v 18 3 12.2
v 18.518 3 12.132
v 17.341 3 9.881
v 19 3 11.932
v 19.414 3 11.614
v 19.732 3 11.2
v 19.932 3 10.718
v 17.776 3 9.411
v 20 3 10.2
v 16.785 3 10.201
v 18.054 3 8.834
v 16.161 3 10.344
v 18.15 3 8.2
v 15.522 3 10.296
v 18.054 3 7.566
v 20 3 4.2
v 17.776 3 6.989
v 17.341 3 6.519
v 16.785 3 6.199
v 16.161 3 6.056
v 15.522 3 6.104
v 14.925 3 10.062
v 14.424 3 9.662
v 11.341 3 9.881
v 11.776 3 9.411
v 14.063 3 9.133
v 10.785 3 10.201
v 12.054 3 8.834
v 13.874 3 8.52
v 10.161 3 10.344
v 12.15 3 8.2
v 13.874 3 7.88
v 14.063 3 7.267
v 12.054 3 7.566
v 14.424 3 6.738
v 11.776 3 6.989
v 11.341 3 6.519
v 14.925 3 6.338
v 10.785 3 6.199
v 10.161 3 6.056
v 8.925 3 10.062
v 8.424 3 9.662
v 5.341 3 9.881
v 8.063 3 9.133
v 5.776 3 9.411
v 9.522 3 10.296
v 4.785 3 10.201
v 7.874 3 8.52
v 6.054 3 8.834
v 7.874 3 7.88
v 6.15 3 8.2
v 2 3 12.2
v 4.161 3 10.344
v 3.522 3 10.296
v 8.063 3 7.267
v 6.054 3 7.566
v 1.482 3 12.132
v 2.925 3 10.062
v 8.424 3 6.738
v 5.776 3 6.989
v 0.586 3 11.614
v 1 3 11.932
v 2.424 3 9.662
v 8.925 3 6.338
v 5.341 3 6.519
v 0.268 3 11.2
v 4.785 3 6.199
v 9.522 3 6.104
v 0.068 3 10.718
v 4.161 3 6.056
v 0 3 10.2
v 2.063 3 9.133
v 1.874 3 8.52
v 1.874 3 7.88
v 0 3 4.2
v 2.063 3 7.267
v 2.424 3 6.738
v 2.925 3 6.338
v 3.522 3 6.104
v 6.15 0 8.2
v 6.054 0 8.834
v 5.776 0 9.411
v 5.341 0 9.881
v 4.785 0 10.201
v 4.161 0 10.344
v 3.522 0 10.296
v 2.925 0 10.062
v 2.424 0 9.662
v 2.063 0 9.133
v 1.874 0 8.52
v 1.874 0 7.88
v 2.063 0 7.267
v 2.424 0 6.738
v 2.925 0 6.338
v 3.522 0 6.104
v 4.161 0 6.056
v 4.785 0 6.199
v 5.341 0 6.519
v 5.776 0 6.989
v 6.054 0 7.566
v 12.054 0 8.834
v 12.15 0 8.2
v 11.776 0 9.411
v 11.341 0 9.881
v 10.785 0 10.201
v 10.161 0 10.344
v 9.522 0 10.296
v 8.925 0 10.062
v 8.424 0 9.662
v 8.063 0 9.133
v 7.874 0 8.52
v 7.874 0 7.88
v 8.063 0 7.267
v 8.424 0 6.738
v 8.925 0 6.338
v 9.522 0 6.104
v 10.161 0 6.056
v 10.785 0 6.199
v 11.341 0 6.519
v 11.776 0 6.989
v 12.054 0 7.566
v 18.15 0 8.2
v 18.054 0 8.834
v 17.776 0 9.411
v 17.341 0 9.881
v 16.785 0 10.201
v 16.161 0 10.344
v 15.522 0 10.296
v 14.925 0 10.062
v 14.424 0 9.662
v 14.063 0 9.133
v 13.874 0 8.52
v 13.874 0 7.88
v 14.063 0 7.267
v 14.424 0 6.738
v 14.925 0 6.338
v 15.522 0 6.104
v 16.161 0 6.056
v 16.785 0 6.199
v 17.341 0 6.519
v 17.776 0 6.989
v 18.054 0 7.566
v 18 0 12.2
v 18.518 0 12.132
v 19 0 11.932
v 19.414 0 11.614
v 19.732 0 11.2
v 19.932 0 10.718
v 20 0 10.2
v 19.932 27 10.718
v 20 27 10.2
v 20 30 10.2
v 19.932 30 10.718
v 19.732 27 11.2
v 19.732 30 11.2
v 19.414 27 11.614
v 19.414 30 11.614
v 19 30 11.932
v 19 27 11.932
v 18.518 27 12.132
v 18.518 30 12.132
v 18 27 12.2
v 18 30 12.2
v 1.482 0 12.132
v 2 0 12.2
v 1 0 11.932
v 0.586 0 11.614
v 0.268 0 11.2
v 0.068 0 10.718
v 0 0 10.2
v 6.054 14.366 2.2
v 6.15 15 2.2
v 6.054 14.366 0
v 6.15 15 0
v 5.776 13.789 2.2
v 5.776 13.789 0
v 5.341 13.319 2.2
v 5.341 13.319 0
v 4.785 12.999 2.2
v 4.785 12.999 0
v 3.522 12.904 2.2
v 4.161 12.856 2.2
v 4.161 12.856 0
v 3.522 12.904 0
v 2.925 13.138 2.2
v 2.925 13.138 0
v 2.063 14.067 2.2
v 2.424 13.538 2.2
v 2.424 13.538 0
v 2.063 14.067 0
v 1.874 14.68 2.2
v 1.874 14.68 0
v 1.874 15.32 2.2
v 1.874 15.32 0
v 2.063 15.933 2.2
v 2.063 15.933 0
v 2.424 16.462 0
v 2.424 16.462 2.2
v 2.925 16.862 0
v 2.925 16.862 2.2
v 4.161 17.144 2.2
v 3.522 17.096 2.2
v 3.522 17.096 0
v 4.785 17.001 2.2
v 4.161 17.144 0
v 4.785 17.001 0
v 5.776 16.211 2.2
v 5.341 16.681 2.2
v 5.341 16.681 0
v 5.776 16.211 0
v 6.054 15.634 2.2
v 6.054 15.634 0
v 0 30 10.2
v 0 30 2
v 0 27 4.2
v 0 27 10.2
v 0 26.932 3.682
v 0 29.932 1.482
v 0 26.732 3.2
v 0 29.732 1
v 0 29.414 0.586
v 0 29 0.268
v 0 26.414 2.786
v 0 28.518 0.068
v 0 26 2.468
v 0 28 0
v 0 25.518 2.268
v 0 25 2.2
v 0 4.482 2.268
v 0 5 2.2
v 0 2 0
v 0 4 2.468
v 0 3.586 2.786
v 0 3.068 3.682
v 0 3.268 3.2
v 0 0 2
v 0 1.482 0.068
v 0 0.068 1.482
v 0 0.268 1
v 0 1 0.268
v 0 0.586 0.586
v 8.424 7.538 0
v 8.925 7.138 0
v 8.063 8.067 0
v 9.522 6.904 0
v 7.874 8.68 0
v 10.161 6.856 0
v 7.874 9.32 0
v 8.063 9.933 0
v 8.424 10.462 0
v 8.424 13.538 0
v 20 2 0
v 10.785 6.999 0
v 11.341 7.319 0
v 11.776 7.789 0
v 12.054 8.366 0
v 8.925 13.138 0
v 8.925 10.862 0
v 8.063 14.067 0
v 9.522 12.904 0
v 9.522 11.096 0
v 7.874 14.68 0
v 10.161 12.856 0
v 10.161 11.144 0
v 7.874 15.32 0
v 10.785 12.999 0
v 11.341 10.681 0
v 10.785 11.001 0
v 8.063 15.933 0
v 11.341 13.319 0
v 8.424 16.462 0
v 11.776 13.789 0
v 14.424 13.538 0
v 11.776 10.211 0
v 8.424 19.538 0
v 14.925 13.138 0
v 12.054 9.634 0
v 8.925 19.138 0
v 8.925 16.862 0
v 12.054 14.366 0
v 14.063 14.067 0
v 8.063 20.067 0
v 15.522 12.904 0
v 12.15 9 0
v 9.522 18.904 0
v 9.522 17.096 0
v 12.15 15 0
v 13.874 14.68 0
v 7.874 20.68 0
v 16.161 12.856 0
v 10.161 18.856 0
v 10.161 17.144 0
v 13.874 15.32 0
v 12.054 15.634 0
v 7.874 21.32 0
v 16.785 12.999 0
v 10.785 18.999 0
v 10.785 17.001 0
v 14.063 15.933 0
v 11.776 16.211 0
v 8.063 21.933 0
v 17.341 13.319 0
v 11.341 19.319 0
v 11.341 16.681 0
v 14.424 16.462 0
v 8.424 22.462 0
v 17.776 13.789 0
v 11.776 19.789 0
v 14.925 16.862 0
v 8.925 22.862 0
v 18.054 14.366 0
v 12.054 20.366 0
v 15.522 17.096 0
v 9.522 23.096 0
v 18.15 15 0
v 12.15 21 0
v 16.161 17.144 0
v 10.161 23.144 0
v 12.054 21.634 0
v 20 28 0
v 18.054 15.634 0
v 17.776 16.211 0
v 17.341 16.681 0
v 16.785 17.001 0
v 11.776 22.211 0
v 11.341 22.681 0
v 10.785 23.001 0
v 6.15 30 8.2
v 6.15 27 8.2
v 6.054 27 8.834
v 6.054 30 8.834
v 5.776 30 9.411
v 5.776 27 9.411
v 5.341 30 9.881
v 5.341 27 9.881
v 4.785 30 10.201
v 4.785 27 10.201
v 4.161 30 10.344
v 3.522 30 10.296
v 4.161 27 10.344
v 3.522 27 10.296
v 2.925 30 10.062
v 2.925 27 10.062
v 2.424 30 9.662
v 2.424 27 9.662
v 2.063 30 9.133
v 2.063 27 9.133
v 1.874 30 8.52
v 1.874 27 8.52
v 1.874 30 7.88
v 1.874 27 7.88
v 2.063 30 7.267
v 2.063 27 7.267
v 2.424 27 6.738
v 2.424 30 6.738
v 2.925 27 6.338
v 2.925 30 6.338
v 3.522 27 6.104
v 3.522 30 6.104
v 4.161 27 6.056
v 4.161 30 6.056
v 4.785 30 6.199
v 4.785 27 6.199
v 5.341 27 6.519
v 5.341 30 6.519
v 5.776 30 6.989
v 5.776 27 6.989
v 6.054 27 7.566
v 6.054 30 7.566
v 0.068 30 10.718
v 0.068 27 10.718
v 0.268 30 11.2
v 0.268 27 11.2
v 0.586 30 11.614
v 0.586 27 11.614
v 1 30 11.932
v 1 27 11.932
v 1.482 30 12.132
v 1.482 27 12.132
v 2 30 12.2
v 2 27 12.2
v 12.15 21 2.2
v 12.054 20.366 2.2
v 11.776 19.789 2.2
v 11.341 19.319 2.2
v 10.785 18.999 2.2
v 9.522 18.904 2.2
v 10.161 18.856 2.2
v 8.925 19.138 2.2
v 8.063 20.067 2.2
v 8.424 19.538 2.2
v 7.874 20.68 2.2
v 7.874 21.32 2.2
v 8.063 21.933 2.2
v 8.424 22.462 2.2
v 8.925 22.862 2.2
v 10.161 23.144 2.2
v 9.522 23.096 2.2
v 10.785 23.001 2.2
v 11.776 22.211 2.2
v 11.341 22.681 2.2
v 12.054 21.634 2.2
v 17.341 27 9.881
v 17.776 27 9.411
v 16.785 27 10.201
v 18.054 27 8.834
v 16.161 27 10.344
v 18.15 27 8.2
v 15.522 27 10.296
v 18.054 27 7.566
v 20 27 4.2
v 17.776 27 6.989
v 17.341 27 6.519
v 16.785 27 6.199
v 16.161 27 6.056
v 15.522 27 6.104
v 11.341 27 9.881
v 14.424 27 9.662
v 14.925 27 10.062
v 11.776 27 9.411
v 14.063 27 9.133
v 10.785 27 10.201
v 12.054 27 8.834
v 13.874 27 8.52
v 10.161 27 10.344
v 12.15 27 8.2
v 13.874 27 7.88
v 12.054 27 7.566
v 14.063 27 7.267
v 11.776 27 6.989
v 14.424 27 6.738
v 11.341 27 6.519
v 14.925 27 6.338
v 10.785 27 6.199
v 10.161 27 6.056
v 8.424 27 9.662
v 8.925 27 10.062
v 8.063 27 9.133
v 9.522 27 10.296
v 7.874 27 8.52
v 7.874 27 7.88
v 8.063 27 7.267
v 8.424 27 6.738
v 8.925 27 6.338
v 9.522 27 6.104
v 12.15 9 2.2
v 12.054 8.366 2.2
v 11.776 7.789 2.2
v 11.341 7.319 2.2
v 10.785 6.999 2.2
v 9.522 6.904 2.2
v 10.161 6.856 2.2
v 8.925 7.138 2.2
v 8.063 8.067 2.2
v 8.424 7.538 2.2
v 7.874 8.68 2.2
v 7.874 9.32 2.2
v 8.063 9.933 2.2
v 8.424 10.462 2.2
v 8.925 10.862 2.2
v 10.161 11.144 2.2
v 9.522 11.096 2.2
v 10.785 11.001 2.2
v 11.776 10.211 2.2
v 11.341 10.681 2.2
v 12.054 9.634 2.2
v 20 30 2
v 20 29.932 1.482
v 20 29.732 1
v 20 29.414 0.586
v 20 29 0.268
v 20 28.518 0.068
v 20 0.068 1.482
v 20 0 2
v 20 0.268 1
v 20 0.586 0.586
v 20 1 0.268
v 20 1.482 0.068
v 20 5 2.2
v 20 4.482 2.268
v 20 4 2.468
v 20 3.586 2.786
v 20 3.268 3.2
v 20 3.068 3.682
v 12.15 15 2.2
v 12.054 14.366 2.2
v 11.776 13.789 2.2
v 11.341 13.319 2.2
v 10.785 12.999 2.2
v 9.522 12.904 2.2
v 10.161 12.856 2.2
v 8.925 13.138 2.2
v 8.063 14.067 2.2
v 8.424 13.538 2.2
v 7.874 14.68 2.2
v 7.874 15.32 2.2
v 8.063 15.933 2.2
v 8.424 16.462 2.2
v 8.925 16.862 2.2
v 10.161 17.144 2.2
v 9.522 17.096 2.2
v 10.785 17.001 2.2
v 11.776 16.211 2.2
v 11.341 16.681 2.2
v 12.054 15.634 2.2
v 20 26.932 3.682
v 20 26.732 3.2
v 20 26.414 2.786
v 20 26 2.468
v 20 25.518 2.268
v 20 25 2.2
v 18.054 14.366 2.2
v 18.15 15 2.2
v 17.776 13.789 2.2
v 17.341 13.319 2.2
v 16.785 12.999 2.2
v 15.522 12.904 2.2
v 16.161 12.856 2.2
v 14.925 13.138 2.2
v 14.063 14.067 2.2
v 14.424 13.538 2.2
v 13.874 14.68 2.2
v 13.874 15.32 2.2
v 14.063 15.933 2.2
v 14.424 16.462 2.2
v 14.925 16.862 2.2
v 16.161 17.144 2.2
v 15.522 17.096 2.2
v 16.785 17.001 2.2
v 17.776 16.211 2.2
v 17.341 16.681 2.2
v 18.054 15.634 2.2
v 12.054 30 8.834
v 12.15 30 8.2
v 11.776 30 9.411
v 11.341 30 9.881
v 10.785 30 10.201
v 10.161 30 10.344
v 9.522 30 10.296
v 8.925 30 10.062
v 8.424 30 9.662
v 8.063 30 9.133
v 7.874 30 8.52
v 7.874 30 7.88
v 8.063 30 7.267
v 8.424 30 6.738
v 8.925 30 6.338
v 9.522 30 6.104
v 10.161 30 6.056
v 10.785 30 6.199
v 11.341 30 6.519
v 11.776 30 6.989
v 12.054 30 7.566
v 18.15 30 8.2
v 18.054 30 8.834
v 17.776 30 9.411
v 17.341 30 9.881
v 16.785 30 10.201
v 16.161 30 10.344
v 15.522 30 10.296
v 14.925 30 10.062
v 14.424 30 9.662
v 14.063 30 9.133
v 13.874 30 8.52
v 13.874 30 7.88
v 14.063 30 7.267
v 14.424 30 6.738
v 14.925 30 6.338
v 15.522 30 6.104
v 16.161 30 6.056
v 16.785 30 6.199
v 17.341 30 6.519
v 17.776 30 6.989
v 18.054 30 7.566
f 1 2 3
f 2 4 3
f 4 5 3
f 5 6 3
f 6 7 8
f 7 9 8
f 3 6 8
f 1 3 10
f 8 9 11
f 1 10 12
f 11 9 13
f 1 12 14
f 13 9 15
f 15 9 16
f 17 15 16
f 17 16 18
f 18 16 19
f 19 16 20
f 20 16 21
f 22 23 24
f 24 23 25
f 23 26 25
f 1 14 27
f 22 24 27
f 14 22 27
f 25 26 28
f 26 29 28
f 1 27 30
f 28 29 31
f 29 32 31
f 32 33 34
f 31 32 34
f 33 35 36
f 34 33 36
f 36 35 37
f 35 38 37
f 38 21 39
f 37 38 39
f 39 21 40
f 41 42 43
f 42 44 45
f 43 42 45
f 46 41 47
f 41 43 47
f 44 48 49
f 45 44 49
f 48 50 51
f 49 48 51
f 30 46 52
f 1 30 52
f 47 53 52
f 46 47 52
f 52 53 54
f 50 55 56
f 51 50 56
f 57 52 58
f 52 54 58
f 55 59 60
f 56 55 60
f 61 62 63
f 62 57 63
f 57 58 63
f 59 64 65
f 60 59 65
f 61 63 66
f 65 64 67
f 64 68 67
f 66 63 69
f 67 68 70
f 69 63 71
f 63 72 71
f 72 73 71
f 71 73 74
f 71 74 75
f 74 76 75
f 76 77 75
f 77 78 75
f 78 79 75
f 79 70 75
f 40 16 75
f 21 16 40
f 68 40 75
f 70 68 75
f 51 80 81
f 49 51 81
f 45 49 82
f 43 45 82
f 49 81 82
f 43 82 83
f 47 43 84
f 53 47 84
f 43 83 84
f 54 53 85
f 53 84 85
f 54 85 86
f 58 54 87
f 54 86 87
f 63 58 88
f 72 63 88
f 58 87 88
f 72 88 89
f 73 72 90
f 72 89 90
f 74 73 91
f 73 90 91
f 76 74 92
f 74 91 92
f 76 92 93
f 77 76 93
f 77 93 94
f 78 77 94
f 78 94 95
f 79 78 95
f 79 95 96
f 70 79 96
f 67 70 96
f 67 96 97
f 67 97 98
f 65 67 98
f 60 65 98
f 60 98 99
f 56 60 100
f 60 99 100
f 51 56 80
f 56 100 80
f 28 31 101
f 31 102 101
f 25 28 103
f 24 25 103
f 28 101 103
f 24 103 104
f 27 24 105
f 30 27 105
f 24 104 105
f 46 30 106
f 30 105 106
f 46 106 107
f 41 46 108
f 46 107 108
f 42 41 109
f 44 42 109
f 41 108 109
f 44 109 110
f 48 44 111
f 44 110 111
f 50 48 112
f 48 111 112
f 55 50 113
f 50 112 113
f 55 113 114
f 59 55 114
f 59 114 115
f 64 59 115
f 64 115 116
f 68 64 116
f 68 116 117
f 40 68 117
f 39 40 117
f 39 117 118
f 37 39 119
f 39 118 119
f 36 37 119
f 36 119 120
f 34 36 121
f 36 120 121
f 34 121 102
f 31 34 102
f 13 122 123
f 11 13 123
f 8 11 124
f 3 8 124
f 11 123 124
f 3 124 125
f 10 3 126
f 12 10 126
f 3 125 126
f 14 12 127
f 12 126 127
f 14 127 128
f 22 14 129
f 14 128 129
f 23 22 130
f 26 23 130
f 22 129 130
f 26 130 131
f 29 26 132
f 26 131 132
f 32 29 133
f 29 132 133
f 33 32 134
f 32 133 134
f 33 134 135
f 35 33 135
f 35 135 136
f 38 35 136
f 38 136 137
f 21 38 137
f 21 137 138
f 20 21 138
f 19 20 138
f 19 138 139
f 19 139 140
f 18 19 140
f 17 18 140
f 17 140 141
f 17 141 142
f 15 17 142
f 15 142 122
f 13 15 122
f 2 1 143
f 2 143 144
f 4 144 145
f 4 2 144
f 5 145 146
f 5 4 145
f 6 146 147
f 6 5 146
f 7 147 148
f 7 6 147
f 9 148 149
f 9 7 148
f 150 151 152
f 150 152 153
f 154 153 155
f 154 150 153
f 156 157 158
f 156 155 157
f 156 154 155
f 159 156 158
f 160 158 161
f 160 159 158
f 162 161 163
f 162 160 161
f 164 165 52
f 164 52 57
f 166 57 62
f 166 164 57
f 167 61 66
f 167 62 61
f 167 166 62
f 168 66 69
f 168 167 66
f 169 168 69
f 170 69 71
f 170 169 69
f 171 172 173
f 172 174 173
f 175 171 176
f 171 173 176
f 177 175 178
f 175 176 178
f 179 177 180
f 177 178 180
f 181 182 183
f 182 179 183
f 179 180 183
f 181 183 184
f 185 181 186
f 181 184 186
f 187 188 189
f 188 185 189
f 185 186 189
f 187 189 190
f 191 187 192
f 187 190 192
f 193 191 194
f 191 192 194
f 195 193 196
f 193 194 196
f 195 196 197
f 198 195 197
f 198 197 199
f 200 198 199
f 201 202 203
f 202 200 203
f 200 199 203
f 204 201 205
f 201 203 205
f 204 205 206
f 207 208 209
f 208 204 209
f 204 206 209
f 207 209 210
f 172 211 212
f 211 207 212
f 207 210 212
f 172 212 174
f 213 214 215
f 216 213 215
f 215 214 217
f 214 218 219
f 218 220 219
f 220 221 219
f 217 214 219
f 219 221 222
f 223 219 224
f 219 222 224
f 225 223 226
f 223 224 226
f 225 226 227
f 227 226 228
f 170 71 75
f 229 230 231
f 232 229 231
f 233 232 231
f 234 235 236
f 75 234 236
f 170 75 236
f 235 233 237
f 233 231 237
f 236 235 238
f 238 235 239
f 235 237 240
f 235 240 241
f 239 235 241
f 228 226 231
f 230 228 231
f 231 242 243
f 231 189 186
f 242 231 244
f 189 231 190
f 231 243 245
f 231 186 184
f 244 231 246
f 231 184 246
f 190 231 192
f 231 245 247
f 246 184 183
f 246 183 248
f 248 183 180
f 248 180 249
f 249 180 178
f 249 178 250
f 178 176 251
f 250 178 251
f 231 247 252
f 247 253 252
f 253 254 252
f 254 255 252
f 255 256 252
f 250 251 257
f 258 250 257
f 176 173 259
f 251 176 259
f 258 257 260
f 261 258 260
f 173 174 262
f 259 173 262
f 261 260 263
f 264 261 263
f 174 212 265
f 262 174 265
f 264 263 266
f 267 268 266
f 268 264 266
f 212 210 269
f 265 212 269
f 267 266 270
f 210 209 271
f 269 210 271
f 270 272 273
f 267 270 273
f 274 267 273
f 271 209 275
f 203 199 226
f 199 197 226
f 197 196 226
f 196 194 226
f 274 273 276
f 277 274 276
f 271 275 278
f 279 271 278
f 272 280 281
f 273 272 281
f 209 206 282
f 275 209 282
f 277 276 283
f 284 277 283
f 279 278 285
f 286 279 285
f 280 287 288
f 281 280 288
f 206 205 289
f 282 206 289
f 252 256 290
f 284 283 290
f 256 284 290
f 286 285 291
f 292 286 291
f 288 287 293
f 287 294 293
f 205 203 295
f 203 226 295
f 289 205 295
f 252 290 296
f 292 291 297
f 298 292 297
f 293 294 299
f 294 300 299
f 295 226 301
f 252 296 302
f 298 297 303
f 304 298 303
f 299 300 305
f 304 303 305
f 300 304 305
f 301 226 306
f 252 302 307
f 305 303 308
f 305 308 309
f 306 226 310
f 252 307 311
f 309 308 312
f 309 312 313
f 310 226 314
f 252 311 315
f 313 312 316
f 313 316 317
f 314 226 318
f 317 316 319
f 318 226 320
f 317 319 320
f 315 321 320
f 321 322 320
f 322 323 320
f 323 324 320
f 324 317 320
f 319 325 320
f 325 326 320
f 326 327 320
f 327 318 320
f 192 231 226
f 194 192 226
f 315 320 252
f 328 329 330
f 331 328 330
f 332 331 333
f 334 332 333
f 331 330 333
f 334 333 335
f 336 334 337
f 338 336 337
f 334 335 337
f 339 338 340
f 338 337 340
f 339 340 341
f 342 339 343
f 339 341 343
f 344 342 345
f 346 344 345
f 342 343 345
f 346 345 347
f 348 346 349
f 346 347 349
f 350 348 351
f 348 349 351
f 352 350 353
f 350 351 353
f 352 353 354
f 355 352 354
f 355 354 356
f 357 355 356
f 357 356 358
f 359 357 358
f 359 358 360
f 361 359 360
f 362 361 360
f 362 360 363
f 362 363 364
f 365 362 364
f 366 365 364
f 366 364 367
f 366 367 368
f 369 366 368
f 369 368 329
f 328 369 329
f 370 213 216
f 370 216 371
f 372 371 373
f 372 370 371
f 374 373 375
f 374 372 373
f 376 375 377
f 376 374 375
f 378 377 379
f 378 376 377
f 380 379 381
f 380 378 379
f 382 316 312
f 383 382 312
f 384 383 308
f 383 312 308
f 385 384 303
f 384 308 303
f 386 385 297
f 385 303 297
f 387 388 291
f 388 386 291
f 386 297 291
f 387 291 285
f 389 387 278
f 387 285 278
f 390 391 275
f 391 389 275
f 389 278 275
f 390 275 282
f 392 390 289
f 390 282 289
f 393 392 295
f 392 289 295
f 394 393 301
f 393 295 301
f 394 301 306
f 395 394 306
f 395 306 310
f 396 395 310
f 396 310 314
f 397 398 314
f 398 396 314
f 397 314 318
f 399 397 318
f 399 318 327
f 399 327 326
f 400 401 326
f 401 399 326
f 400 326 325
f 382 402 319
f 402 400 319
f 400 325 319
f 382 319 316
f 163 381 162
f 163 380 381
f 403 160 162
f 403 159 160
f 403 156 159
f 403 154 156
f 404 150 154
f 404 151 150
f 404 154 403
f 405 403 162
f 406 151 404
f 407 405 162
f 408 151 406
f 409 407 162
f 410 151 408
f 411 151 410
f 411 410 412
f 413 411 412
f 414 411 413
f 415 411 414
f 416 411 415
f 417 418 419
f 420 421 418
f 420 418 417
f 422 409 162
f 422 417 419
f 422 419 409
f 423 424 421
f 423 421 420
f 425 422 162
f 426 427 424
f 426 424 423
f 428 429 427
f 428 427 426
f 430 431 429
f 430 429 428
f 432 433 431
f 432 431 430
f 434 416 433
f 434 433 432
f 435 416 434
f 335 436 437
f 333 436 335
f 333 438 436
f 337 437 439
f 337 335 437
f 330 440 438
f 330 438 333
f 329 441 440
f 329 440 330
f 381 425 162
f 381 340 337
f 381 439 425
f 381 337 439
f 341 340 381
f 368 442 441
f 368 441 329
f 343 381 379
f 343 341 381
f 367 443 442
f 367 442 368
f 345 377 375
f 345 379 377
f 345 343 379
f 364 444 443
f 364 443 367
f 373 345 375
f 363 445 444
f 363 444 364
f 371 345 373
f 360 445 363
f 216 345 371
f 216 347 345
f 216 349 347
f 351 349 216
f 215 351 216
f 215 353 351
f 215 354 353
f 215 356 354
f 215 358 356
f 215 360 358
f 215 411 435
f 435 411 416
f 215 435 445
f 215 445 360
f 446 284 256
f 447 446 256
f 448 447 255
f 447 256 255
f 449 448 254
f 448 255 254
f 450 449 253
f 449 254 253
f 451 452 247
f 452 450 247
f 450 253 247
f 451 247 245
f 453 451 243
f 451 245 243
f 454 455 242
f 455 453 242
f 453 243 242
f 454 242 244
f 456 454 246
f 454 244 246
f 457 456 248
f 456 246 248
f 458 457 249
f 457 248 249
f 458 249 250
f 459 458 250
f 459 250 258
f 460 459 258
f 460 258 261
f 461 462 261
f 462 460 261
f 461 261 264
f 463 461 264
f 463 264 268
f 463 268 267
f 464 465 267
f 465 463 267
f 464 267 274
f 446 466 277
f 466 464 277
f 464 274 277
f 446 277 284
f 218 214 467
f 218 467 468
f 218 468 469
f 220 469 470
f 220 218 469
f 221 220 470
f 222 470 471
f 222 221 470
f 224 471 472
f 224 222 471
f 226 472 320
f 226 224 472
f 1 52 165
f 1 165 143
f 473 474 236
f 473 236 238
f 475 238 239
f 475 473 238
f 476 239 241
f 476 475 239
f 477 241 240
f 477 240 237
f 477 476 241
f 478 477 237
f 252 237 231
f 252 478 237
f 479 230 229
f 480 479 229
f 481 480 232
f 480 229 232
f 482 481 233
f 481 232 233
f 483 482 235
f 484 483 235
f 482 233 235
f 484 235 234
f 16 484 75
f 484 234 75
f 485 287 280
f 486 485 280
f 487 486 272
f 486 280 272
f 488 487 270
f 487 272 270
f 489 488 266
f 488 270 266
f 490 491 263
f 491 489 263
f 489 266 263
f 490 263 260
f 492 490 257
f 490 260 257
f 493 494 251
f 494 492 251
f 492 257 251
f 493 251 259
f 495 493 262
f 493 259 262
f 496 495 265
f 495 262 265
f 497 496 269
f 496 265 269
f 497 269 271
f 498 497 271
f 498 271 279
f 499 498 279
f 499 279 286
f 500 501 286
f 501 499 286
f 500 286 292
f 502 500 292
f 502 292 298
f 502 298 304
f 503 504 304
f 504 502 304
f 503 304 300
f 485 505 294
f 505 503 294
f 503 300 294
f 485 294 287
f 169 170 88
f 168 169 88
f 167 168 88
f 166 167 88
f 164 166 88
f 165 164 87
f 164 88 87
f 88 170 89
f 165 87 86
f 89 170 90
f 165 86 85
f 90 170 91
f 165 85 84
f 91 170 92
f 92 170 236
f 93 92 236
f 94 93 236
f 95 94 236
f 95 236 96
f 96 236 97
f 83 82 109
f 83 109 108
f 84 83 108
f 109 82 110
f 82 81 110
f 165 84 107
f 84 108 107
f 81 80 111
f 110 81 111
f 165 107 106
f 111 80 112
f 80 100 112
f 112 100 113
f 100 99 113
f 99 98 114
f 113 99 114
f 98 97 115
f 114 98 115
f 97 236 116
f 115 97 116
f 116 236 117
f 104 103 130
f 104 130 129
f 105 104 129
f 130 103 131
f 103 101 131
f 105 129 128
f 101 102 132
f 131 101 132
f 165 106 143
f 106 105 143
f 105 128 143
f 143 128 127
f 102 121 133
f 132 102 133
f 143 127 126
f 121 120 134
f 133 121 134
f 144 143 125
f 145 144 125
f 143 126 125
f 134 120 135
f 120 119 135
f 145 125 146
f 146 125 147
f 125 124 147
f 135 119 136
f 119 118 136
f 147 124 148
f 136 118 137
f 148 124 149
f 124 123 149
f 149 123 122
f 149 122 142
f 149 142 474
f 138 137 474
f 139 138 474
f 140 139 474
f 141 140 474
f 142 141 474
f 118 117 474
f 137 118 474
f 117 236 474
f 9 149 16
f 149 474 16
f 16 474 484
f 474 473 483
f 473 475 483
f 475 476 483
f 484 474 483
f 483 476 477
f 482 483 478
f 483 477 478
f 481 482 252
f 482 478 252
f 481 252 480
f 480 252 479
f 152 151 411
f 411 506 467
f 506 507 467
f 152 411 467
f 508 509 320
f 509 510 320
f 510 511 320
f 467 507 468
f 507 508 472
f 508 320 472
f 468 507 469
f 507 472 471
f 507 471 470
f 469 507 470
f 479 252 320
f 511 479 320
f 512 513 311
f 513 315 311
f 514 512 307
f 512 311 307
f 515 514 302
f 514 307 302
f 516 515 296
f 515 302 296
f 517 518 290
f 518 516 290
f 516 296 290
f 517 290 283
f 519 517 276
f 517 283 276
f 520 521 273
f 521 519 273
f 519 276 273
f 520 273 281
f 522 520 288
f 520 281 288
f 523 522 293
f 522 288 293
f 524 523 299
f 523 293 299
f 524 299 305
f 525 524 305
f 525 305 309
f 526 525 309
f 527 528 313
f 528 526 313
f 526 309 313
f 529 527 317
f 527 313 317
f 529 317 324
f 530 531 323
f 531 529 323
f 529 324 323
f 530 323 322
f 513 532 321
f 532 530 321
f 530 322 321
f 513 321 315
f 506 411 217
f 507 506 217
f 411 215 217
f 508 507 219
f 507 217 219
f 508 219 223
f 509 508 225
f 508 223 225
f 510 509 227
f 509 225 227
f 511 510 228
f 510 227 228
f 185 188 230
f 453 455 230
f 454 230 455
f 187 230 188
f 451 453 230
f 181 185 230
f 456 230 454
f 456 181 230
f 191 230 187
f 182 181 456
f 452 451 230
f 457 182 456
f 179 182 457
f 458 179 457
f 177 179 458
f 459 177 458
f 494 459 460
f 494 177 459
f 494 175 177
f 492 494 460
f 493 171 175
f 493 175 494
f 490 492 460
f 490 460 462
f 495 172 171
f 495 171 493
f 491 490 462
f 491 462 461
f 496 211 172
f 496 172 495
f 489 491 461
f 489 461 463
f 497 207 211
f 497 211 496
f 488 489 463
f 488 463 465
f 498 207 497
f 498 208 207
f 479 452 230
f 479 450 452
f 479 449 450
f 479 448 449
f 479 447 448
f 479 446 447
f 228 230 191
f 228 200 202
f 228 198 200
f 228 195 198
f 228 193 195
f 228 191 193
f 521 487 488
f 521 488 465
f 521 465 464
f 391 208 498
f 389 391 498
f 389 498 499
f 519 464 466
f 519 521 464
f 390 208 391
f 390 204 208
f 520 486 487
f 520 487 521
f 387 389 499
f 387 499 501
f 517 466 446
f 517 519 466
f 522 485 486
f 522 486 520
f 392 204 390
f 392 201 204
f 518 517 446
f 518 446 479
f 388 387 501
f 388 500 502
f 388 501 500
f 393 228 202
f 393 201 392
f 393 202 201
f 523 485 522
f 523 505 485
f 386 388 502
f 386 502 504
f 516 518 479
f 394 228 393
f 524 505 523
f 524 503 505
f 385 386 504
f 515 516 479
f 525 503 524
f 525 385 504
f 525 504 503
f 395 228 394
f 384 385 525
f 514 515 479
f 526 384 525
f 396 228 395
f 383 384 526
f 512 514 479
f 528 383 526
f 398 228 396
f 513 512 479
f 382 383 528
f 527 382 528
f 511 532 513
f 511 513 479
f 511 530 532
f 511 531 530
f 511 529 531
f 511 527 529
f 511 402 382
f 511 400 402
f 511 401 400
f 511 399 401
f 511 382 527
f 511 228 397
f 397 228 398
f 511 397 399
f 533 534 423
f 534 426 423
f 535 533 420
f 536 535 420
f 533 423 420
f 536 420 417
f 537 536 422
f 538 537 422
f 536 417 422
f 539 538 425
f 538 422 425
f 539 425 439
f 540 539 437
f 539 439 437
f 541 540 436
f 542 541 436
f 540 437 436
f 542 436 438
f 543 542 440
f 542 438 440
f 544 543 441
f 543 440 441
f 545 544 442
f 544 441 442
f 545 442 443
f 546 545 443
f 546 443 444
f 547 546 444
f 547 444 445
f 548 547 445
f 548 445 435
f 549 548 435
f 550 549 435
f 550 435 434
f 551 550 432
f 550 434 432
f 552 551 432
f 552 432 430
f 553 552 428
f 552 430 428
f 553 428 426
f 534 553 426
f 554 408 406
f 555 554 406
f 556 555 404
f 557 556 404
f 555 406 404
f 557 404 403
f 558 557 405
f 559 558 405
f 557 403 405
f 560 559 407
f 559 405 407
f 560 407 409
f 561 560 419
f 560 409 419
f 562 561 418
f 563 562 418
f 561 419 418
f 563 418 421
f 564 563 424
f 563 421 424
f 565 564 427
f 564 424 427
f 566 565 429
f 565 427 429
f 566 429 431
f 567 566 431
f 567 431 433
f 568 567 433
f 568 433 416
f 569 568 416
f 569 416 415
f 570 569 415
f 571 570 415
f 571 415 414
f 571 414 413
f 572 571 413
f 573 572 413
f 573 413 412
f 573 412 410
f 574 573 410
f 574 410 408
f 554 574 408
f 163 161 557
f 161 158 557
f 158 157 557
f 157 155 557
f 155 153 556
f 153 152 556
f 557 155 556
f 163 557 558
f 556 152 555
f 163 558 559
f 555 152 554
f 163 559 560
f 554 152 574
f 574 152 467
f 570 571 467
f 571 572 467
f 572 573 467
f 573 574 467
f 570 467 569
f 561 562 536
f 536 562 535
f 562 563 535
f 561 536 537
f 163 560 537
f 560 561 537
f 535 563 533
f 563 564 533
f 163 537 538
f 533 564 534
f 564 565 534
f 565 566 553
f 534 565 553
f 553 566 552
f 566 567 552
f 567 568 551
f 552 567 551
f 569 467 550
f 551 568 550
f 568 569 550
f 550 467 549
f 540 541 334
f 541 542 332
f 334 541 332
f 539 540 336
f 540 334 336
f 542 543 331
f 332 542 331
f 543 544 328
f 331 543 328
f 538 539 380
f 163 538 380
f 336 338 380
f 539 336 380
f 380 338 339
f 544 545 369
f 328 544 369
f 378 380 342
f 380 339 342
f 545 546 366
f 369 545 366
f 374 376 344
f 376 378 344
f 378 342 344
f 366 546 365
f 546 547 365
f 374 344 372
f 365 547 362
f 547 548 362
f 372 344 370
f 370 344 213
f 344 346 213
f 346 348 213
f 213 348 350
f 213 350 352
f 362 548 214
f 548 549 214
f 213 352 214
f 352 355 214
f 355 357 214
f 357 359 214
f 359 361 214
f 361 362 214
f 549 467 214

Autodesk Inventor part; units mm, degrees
ref_plane "YZ Plane" through (0, 0, 0) normal (1, 0, 0) x (0, 1, 0)
ref_plane "XZ Plane" through (0, 0, 0) normal (0, 1, 0) x (-1, 0, 0)
ref_plane "XY Plane" through (0, 0, 0) normal (0, 0, 1) x (1, 0, 0)
sketch "Esquisse5" plane through (0, 0, 0) normal (0, 0, 1) x (1, 0, 0)
  line L0 (0, 0) -> (20, 0)
  line L1 (20, 0) -> (20, 30)
  line L2 (20, 30) -> (0, 30)
  line L3 (0, 30) -> (0, 0)
  line L4 (10, 0) -> (10, 30) construction
  circle A0 centre (10, 9) radius 2.15
  circle A1 centre (10, 15) radius 2.15
  circle A2 centre (10, 21) radius 2.15
  line L5 (10, 15) -> (20, 15) construction
  circle A3 centre (16, 15) radius 2.15
  circle A4 centre (4, 15) radius 2.15
  circle A5 centre (10, 15) radius 2.15
  dimension "d61" = 20
  dimension "d62" = 30
  dimension "d64" = 4.3
  dimension "d67" = 6
  dimension "d74" = 6
  dimension "d77" = 6
extrude "Extrusion5" add sketch "Esquisse5" along normal blind 2.2
sketch "Esquisse9" plane through (0, 0, 2.2) normal (0, 0, 1) x (1, 0, 0)
  line L0 (20, 0) -> (20, 30) construction
  line L1 (0, 30) -> (0, 0) construction
  line L2 (0, 30) -> (20, 30)
  line L3 (20, 30) -> (20, 27)
  line L4 (20, 27) -> (0, 27)
  line L5 (0, 27) -> (0, 30)
  line L6 (0, 15) -> (20, 15) construction
  line L7 (20, 0) -> (0, 0) construction
  line L8 (0, 0) -> (20, 0)
  line L9 (20, 0) -> (20, 3)
  line L10 (20, 3) -> (0, 3)
  line L11 (0, 3) -> (0, 0)
  dimension "d102" = 3
extrude "Extrusion9" add sketch "Esquisse9" along normal blind 10
sketch "Esquisse10" plane through (0, 0, 0) normal (0, -1, 0) x (1, 0, 0)
  line L0 (0, 0) -> (20, 0) construction
  line L1 (20, 0) -> (20, 12.2) construction
  line L2 (0, 12.2) -> (20, 12.2) construction
  line L3 (10, 12.2) -> (10, 0) construction
  circle A0 centre (10, 8.2) radius 2.15
  line L4 (10, 8.2) -> (20, 8.2) construction
  circle A1 centre (16, 8.2) radius 2.15
  circle A2 centre (4, 8.2) radius 2.15
  circle A3 centre (10, 8.2) radius 2.15
  dimension "d105" = 4
  dimension "d106" = 4.3
  dimension "d109" = 6
  dimension "d112" = 6
extrude "Extrusion10" cut sketch "Esquisse10" against normal through all
fillet "Congé6" radius 2 8 edges at (10, 0, 0) (10, 3, 2.2) (10, 27, 2.2) (0, 28.5, 12.2) (20, 28.5, 12.2) (20, 1.5, 12.2) (0, 1.5, 12.2) (10, 30, 0)
equation "\"d64\" = Holes"
equation "\"d80\" = Depth"
equation "\"d106\" = Holes"
equation "\"Depth\" = 2.2"
equation "\"Holes\" = 4.3"
equation "\"Height\" = 0"
equation "\"Rounding\" = 7"
properties part number "Pantilt"
